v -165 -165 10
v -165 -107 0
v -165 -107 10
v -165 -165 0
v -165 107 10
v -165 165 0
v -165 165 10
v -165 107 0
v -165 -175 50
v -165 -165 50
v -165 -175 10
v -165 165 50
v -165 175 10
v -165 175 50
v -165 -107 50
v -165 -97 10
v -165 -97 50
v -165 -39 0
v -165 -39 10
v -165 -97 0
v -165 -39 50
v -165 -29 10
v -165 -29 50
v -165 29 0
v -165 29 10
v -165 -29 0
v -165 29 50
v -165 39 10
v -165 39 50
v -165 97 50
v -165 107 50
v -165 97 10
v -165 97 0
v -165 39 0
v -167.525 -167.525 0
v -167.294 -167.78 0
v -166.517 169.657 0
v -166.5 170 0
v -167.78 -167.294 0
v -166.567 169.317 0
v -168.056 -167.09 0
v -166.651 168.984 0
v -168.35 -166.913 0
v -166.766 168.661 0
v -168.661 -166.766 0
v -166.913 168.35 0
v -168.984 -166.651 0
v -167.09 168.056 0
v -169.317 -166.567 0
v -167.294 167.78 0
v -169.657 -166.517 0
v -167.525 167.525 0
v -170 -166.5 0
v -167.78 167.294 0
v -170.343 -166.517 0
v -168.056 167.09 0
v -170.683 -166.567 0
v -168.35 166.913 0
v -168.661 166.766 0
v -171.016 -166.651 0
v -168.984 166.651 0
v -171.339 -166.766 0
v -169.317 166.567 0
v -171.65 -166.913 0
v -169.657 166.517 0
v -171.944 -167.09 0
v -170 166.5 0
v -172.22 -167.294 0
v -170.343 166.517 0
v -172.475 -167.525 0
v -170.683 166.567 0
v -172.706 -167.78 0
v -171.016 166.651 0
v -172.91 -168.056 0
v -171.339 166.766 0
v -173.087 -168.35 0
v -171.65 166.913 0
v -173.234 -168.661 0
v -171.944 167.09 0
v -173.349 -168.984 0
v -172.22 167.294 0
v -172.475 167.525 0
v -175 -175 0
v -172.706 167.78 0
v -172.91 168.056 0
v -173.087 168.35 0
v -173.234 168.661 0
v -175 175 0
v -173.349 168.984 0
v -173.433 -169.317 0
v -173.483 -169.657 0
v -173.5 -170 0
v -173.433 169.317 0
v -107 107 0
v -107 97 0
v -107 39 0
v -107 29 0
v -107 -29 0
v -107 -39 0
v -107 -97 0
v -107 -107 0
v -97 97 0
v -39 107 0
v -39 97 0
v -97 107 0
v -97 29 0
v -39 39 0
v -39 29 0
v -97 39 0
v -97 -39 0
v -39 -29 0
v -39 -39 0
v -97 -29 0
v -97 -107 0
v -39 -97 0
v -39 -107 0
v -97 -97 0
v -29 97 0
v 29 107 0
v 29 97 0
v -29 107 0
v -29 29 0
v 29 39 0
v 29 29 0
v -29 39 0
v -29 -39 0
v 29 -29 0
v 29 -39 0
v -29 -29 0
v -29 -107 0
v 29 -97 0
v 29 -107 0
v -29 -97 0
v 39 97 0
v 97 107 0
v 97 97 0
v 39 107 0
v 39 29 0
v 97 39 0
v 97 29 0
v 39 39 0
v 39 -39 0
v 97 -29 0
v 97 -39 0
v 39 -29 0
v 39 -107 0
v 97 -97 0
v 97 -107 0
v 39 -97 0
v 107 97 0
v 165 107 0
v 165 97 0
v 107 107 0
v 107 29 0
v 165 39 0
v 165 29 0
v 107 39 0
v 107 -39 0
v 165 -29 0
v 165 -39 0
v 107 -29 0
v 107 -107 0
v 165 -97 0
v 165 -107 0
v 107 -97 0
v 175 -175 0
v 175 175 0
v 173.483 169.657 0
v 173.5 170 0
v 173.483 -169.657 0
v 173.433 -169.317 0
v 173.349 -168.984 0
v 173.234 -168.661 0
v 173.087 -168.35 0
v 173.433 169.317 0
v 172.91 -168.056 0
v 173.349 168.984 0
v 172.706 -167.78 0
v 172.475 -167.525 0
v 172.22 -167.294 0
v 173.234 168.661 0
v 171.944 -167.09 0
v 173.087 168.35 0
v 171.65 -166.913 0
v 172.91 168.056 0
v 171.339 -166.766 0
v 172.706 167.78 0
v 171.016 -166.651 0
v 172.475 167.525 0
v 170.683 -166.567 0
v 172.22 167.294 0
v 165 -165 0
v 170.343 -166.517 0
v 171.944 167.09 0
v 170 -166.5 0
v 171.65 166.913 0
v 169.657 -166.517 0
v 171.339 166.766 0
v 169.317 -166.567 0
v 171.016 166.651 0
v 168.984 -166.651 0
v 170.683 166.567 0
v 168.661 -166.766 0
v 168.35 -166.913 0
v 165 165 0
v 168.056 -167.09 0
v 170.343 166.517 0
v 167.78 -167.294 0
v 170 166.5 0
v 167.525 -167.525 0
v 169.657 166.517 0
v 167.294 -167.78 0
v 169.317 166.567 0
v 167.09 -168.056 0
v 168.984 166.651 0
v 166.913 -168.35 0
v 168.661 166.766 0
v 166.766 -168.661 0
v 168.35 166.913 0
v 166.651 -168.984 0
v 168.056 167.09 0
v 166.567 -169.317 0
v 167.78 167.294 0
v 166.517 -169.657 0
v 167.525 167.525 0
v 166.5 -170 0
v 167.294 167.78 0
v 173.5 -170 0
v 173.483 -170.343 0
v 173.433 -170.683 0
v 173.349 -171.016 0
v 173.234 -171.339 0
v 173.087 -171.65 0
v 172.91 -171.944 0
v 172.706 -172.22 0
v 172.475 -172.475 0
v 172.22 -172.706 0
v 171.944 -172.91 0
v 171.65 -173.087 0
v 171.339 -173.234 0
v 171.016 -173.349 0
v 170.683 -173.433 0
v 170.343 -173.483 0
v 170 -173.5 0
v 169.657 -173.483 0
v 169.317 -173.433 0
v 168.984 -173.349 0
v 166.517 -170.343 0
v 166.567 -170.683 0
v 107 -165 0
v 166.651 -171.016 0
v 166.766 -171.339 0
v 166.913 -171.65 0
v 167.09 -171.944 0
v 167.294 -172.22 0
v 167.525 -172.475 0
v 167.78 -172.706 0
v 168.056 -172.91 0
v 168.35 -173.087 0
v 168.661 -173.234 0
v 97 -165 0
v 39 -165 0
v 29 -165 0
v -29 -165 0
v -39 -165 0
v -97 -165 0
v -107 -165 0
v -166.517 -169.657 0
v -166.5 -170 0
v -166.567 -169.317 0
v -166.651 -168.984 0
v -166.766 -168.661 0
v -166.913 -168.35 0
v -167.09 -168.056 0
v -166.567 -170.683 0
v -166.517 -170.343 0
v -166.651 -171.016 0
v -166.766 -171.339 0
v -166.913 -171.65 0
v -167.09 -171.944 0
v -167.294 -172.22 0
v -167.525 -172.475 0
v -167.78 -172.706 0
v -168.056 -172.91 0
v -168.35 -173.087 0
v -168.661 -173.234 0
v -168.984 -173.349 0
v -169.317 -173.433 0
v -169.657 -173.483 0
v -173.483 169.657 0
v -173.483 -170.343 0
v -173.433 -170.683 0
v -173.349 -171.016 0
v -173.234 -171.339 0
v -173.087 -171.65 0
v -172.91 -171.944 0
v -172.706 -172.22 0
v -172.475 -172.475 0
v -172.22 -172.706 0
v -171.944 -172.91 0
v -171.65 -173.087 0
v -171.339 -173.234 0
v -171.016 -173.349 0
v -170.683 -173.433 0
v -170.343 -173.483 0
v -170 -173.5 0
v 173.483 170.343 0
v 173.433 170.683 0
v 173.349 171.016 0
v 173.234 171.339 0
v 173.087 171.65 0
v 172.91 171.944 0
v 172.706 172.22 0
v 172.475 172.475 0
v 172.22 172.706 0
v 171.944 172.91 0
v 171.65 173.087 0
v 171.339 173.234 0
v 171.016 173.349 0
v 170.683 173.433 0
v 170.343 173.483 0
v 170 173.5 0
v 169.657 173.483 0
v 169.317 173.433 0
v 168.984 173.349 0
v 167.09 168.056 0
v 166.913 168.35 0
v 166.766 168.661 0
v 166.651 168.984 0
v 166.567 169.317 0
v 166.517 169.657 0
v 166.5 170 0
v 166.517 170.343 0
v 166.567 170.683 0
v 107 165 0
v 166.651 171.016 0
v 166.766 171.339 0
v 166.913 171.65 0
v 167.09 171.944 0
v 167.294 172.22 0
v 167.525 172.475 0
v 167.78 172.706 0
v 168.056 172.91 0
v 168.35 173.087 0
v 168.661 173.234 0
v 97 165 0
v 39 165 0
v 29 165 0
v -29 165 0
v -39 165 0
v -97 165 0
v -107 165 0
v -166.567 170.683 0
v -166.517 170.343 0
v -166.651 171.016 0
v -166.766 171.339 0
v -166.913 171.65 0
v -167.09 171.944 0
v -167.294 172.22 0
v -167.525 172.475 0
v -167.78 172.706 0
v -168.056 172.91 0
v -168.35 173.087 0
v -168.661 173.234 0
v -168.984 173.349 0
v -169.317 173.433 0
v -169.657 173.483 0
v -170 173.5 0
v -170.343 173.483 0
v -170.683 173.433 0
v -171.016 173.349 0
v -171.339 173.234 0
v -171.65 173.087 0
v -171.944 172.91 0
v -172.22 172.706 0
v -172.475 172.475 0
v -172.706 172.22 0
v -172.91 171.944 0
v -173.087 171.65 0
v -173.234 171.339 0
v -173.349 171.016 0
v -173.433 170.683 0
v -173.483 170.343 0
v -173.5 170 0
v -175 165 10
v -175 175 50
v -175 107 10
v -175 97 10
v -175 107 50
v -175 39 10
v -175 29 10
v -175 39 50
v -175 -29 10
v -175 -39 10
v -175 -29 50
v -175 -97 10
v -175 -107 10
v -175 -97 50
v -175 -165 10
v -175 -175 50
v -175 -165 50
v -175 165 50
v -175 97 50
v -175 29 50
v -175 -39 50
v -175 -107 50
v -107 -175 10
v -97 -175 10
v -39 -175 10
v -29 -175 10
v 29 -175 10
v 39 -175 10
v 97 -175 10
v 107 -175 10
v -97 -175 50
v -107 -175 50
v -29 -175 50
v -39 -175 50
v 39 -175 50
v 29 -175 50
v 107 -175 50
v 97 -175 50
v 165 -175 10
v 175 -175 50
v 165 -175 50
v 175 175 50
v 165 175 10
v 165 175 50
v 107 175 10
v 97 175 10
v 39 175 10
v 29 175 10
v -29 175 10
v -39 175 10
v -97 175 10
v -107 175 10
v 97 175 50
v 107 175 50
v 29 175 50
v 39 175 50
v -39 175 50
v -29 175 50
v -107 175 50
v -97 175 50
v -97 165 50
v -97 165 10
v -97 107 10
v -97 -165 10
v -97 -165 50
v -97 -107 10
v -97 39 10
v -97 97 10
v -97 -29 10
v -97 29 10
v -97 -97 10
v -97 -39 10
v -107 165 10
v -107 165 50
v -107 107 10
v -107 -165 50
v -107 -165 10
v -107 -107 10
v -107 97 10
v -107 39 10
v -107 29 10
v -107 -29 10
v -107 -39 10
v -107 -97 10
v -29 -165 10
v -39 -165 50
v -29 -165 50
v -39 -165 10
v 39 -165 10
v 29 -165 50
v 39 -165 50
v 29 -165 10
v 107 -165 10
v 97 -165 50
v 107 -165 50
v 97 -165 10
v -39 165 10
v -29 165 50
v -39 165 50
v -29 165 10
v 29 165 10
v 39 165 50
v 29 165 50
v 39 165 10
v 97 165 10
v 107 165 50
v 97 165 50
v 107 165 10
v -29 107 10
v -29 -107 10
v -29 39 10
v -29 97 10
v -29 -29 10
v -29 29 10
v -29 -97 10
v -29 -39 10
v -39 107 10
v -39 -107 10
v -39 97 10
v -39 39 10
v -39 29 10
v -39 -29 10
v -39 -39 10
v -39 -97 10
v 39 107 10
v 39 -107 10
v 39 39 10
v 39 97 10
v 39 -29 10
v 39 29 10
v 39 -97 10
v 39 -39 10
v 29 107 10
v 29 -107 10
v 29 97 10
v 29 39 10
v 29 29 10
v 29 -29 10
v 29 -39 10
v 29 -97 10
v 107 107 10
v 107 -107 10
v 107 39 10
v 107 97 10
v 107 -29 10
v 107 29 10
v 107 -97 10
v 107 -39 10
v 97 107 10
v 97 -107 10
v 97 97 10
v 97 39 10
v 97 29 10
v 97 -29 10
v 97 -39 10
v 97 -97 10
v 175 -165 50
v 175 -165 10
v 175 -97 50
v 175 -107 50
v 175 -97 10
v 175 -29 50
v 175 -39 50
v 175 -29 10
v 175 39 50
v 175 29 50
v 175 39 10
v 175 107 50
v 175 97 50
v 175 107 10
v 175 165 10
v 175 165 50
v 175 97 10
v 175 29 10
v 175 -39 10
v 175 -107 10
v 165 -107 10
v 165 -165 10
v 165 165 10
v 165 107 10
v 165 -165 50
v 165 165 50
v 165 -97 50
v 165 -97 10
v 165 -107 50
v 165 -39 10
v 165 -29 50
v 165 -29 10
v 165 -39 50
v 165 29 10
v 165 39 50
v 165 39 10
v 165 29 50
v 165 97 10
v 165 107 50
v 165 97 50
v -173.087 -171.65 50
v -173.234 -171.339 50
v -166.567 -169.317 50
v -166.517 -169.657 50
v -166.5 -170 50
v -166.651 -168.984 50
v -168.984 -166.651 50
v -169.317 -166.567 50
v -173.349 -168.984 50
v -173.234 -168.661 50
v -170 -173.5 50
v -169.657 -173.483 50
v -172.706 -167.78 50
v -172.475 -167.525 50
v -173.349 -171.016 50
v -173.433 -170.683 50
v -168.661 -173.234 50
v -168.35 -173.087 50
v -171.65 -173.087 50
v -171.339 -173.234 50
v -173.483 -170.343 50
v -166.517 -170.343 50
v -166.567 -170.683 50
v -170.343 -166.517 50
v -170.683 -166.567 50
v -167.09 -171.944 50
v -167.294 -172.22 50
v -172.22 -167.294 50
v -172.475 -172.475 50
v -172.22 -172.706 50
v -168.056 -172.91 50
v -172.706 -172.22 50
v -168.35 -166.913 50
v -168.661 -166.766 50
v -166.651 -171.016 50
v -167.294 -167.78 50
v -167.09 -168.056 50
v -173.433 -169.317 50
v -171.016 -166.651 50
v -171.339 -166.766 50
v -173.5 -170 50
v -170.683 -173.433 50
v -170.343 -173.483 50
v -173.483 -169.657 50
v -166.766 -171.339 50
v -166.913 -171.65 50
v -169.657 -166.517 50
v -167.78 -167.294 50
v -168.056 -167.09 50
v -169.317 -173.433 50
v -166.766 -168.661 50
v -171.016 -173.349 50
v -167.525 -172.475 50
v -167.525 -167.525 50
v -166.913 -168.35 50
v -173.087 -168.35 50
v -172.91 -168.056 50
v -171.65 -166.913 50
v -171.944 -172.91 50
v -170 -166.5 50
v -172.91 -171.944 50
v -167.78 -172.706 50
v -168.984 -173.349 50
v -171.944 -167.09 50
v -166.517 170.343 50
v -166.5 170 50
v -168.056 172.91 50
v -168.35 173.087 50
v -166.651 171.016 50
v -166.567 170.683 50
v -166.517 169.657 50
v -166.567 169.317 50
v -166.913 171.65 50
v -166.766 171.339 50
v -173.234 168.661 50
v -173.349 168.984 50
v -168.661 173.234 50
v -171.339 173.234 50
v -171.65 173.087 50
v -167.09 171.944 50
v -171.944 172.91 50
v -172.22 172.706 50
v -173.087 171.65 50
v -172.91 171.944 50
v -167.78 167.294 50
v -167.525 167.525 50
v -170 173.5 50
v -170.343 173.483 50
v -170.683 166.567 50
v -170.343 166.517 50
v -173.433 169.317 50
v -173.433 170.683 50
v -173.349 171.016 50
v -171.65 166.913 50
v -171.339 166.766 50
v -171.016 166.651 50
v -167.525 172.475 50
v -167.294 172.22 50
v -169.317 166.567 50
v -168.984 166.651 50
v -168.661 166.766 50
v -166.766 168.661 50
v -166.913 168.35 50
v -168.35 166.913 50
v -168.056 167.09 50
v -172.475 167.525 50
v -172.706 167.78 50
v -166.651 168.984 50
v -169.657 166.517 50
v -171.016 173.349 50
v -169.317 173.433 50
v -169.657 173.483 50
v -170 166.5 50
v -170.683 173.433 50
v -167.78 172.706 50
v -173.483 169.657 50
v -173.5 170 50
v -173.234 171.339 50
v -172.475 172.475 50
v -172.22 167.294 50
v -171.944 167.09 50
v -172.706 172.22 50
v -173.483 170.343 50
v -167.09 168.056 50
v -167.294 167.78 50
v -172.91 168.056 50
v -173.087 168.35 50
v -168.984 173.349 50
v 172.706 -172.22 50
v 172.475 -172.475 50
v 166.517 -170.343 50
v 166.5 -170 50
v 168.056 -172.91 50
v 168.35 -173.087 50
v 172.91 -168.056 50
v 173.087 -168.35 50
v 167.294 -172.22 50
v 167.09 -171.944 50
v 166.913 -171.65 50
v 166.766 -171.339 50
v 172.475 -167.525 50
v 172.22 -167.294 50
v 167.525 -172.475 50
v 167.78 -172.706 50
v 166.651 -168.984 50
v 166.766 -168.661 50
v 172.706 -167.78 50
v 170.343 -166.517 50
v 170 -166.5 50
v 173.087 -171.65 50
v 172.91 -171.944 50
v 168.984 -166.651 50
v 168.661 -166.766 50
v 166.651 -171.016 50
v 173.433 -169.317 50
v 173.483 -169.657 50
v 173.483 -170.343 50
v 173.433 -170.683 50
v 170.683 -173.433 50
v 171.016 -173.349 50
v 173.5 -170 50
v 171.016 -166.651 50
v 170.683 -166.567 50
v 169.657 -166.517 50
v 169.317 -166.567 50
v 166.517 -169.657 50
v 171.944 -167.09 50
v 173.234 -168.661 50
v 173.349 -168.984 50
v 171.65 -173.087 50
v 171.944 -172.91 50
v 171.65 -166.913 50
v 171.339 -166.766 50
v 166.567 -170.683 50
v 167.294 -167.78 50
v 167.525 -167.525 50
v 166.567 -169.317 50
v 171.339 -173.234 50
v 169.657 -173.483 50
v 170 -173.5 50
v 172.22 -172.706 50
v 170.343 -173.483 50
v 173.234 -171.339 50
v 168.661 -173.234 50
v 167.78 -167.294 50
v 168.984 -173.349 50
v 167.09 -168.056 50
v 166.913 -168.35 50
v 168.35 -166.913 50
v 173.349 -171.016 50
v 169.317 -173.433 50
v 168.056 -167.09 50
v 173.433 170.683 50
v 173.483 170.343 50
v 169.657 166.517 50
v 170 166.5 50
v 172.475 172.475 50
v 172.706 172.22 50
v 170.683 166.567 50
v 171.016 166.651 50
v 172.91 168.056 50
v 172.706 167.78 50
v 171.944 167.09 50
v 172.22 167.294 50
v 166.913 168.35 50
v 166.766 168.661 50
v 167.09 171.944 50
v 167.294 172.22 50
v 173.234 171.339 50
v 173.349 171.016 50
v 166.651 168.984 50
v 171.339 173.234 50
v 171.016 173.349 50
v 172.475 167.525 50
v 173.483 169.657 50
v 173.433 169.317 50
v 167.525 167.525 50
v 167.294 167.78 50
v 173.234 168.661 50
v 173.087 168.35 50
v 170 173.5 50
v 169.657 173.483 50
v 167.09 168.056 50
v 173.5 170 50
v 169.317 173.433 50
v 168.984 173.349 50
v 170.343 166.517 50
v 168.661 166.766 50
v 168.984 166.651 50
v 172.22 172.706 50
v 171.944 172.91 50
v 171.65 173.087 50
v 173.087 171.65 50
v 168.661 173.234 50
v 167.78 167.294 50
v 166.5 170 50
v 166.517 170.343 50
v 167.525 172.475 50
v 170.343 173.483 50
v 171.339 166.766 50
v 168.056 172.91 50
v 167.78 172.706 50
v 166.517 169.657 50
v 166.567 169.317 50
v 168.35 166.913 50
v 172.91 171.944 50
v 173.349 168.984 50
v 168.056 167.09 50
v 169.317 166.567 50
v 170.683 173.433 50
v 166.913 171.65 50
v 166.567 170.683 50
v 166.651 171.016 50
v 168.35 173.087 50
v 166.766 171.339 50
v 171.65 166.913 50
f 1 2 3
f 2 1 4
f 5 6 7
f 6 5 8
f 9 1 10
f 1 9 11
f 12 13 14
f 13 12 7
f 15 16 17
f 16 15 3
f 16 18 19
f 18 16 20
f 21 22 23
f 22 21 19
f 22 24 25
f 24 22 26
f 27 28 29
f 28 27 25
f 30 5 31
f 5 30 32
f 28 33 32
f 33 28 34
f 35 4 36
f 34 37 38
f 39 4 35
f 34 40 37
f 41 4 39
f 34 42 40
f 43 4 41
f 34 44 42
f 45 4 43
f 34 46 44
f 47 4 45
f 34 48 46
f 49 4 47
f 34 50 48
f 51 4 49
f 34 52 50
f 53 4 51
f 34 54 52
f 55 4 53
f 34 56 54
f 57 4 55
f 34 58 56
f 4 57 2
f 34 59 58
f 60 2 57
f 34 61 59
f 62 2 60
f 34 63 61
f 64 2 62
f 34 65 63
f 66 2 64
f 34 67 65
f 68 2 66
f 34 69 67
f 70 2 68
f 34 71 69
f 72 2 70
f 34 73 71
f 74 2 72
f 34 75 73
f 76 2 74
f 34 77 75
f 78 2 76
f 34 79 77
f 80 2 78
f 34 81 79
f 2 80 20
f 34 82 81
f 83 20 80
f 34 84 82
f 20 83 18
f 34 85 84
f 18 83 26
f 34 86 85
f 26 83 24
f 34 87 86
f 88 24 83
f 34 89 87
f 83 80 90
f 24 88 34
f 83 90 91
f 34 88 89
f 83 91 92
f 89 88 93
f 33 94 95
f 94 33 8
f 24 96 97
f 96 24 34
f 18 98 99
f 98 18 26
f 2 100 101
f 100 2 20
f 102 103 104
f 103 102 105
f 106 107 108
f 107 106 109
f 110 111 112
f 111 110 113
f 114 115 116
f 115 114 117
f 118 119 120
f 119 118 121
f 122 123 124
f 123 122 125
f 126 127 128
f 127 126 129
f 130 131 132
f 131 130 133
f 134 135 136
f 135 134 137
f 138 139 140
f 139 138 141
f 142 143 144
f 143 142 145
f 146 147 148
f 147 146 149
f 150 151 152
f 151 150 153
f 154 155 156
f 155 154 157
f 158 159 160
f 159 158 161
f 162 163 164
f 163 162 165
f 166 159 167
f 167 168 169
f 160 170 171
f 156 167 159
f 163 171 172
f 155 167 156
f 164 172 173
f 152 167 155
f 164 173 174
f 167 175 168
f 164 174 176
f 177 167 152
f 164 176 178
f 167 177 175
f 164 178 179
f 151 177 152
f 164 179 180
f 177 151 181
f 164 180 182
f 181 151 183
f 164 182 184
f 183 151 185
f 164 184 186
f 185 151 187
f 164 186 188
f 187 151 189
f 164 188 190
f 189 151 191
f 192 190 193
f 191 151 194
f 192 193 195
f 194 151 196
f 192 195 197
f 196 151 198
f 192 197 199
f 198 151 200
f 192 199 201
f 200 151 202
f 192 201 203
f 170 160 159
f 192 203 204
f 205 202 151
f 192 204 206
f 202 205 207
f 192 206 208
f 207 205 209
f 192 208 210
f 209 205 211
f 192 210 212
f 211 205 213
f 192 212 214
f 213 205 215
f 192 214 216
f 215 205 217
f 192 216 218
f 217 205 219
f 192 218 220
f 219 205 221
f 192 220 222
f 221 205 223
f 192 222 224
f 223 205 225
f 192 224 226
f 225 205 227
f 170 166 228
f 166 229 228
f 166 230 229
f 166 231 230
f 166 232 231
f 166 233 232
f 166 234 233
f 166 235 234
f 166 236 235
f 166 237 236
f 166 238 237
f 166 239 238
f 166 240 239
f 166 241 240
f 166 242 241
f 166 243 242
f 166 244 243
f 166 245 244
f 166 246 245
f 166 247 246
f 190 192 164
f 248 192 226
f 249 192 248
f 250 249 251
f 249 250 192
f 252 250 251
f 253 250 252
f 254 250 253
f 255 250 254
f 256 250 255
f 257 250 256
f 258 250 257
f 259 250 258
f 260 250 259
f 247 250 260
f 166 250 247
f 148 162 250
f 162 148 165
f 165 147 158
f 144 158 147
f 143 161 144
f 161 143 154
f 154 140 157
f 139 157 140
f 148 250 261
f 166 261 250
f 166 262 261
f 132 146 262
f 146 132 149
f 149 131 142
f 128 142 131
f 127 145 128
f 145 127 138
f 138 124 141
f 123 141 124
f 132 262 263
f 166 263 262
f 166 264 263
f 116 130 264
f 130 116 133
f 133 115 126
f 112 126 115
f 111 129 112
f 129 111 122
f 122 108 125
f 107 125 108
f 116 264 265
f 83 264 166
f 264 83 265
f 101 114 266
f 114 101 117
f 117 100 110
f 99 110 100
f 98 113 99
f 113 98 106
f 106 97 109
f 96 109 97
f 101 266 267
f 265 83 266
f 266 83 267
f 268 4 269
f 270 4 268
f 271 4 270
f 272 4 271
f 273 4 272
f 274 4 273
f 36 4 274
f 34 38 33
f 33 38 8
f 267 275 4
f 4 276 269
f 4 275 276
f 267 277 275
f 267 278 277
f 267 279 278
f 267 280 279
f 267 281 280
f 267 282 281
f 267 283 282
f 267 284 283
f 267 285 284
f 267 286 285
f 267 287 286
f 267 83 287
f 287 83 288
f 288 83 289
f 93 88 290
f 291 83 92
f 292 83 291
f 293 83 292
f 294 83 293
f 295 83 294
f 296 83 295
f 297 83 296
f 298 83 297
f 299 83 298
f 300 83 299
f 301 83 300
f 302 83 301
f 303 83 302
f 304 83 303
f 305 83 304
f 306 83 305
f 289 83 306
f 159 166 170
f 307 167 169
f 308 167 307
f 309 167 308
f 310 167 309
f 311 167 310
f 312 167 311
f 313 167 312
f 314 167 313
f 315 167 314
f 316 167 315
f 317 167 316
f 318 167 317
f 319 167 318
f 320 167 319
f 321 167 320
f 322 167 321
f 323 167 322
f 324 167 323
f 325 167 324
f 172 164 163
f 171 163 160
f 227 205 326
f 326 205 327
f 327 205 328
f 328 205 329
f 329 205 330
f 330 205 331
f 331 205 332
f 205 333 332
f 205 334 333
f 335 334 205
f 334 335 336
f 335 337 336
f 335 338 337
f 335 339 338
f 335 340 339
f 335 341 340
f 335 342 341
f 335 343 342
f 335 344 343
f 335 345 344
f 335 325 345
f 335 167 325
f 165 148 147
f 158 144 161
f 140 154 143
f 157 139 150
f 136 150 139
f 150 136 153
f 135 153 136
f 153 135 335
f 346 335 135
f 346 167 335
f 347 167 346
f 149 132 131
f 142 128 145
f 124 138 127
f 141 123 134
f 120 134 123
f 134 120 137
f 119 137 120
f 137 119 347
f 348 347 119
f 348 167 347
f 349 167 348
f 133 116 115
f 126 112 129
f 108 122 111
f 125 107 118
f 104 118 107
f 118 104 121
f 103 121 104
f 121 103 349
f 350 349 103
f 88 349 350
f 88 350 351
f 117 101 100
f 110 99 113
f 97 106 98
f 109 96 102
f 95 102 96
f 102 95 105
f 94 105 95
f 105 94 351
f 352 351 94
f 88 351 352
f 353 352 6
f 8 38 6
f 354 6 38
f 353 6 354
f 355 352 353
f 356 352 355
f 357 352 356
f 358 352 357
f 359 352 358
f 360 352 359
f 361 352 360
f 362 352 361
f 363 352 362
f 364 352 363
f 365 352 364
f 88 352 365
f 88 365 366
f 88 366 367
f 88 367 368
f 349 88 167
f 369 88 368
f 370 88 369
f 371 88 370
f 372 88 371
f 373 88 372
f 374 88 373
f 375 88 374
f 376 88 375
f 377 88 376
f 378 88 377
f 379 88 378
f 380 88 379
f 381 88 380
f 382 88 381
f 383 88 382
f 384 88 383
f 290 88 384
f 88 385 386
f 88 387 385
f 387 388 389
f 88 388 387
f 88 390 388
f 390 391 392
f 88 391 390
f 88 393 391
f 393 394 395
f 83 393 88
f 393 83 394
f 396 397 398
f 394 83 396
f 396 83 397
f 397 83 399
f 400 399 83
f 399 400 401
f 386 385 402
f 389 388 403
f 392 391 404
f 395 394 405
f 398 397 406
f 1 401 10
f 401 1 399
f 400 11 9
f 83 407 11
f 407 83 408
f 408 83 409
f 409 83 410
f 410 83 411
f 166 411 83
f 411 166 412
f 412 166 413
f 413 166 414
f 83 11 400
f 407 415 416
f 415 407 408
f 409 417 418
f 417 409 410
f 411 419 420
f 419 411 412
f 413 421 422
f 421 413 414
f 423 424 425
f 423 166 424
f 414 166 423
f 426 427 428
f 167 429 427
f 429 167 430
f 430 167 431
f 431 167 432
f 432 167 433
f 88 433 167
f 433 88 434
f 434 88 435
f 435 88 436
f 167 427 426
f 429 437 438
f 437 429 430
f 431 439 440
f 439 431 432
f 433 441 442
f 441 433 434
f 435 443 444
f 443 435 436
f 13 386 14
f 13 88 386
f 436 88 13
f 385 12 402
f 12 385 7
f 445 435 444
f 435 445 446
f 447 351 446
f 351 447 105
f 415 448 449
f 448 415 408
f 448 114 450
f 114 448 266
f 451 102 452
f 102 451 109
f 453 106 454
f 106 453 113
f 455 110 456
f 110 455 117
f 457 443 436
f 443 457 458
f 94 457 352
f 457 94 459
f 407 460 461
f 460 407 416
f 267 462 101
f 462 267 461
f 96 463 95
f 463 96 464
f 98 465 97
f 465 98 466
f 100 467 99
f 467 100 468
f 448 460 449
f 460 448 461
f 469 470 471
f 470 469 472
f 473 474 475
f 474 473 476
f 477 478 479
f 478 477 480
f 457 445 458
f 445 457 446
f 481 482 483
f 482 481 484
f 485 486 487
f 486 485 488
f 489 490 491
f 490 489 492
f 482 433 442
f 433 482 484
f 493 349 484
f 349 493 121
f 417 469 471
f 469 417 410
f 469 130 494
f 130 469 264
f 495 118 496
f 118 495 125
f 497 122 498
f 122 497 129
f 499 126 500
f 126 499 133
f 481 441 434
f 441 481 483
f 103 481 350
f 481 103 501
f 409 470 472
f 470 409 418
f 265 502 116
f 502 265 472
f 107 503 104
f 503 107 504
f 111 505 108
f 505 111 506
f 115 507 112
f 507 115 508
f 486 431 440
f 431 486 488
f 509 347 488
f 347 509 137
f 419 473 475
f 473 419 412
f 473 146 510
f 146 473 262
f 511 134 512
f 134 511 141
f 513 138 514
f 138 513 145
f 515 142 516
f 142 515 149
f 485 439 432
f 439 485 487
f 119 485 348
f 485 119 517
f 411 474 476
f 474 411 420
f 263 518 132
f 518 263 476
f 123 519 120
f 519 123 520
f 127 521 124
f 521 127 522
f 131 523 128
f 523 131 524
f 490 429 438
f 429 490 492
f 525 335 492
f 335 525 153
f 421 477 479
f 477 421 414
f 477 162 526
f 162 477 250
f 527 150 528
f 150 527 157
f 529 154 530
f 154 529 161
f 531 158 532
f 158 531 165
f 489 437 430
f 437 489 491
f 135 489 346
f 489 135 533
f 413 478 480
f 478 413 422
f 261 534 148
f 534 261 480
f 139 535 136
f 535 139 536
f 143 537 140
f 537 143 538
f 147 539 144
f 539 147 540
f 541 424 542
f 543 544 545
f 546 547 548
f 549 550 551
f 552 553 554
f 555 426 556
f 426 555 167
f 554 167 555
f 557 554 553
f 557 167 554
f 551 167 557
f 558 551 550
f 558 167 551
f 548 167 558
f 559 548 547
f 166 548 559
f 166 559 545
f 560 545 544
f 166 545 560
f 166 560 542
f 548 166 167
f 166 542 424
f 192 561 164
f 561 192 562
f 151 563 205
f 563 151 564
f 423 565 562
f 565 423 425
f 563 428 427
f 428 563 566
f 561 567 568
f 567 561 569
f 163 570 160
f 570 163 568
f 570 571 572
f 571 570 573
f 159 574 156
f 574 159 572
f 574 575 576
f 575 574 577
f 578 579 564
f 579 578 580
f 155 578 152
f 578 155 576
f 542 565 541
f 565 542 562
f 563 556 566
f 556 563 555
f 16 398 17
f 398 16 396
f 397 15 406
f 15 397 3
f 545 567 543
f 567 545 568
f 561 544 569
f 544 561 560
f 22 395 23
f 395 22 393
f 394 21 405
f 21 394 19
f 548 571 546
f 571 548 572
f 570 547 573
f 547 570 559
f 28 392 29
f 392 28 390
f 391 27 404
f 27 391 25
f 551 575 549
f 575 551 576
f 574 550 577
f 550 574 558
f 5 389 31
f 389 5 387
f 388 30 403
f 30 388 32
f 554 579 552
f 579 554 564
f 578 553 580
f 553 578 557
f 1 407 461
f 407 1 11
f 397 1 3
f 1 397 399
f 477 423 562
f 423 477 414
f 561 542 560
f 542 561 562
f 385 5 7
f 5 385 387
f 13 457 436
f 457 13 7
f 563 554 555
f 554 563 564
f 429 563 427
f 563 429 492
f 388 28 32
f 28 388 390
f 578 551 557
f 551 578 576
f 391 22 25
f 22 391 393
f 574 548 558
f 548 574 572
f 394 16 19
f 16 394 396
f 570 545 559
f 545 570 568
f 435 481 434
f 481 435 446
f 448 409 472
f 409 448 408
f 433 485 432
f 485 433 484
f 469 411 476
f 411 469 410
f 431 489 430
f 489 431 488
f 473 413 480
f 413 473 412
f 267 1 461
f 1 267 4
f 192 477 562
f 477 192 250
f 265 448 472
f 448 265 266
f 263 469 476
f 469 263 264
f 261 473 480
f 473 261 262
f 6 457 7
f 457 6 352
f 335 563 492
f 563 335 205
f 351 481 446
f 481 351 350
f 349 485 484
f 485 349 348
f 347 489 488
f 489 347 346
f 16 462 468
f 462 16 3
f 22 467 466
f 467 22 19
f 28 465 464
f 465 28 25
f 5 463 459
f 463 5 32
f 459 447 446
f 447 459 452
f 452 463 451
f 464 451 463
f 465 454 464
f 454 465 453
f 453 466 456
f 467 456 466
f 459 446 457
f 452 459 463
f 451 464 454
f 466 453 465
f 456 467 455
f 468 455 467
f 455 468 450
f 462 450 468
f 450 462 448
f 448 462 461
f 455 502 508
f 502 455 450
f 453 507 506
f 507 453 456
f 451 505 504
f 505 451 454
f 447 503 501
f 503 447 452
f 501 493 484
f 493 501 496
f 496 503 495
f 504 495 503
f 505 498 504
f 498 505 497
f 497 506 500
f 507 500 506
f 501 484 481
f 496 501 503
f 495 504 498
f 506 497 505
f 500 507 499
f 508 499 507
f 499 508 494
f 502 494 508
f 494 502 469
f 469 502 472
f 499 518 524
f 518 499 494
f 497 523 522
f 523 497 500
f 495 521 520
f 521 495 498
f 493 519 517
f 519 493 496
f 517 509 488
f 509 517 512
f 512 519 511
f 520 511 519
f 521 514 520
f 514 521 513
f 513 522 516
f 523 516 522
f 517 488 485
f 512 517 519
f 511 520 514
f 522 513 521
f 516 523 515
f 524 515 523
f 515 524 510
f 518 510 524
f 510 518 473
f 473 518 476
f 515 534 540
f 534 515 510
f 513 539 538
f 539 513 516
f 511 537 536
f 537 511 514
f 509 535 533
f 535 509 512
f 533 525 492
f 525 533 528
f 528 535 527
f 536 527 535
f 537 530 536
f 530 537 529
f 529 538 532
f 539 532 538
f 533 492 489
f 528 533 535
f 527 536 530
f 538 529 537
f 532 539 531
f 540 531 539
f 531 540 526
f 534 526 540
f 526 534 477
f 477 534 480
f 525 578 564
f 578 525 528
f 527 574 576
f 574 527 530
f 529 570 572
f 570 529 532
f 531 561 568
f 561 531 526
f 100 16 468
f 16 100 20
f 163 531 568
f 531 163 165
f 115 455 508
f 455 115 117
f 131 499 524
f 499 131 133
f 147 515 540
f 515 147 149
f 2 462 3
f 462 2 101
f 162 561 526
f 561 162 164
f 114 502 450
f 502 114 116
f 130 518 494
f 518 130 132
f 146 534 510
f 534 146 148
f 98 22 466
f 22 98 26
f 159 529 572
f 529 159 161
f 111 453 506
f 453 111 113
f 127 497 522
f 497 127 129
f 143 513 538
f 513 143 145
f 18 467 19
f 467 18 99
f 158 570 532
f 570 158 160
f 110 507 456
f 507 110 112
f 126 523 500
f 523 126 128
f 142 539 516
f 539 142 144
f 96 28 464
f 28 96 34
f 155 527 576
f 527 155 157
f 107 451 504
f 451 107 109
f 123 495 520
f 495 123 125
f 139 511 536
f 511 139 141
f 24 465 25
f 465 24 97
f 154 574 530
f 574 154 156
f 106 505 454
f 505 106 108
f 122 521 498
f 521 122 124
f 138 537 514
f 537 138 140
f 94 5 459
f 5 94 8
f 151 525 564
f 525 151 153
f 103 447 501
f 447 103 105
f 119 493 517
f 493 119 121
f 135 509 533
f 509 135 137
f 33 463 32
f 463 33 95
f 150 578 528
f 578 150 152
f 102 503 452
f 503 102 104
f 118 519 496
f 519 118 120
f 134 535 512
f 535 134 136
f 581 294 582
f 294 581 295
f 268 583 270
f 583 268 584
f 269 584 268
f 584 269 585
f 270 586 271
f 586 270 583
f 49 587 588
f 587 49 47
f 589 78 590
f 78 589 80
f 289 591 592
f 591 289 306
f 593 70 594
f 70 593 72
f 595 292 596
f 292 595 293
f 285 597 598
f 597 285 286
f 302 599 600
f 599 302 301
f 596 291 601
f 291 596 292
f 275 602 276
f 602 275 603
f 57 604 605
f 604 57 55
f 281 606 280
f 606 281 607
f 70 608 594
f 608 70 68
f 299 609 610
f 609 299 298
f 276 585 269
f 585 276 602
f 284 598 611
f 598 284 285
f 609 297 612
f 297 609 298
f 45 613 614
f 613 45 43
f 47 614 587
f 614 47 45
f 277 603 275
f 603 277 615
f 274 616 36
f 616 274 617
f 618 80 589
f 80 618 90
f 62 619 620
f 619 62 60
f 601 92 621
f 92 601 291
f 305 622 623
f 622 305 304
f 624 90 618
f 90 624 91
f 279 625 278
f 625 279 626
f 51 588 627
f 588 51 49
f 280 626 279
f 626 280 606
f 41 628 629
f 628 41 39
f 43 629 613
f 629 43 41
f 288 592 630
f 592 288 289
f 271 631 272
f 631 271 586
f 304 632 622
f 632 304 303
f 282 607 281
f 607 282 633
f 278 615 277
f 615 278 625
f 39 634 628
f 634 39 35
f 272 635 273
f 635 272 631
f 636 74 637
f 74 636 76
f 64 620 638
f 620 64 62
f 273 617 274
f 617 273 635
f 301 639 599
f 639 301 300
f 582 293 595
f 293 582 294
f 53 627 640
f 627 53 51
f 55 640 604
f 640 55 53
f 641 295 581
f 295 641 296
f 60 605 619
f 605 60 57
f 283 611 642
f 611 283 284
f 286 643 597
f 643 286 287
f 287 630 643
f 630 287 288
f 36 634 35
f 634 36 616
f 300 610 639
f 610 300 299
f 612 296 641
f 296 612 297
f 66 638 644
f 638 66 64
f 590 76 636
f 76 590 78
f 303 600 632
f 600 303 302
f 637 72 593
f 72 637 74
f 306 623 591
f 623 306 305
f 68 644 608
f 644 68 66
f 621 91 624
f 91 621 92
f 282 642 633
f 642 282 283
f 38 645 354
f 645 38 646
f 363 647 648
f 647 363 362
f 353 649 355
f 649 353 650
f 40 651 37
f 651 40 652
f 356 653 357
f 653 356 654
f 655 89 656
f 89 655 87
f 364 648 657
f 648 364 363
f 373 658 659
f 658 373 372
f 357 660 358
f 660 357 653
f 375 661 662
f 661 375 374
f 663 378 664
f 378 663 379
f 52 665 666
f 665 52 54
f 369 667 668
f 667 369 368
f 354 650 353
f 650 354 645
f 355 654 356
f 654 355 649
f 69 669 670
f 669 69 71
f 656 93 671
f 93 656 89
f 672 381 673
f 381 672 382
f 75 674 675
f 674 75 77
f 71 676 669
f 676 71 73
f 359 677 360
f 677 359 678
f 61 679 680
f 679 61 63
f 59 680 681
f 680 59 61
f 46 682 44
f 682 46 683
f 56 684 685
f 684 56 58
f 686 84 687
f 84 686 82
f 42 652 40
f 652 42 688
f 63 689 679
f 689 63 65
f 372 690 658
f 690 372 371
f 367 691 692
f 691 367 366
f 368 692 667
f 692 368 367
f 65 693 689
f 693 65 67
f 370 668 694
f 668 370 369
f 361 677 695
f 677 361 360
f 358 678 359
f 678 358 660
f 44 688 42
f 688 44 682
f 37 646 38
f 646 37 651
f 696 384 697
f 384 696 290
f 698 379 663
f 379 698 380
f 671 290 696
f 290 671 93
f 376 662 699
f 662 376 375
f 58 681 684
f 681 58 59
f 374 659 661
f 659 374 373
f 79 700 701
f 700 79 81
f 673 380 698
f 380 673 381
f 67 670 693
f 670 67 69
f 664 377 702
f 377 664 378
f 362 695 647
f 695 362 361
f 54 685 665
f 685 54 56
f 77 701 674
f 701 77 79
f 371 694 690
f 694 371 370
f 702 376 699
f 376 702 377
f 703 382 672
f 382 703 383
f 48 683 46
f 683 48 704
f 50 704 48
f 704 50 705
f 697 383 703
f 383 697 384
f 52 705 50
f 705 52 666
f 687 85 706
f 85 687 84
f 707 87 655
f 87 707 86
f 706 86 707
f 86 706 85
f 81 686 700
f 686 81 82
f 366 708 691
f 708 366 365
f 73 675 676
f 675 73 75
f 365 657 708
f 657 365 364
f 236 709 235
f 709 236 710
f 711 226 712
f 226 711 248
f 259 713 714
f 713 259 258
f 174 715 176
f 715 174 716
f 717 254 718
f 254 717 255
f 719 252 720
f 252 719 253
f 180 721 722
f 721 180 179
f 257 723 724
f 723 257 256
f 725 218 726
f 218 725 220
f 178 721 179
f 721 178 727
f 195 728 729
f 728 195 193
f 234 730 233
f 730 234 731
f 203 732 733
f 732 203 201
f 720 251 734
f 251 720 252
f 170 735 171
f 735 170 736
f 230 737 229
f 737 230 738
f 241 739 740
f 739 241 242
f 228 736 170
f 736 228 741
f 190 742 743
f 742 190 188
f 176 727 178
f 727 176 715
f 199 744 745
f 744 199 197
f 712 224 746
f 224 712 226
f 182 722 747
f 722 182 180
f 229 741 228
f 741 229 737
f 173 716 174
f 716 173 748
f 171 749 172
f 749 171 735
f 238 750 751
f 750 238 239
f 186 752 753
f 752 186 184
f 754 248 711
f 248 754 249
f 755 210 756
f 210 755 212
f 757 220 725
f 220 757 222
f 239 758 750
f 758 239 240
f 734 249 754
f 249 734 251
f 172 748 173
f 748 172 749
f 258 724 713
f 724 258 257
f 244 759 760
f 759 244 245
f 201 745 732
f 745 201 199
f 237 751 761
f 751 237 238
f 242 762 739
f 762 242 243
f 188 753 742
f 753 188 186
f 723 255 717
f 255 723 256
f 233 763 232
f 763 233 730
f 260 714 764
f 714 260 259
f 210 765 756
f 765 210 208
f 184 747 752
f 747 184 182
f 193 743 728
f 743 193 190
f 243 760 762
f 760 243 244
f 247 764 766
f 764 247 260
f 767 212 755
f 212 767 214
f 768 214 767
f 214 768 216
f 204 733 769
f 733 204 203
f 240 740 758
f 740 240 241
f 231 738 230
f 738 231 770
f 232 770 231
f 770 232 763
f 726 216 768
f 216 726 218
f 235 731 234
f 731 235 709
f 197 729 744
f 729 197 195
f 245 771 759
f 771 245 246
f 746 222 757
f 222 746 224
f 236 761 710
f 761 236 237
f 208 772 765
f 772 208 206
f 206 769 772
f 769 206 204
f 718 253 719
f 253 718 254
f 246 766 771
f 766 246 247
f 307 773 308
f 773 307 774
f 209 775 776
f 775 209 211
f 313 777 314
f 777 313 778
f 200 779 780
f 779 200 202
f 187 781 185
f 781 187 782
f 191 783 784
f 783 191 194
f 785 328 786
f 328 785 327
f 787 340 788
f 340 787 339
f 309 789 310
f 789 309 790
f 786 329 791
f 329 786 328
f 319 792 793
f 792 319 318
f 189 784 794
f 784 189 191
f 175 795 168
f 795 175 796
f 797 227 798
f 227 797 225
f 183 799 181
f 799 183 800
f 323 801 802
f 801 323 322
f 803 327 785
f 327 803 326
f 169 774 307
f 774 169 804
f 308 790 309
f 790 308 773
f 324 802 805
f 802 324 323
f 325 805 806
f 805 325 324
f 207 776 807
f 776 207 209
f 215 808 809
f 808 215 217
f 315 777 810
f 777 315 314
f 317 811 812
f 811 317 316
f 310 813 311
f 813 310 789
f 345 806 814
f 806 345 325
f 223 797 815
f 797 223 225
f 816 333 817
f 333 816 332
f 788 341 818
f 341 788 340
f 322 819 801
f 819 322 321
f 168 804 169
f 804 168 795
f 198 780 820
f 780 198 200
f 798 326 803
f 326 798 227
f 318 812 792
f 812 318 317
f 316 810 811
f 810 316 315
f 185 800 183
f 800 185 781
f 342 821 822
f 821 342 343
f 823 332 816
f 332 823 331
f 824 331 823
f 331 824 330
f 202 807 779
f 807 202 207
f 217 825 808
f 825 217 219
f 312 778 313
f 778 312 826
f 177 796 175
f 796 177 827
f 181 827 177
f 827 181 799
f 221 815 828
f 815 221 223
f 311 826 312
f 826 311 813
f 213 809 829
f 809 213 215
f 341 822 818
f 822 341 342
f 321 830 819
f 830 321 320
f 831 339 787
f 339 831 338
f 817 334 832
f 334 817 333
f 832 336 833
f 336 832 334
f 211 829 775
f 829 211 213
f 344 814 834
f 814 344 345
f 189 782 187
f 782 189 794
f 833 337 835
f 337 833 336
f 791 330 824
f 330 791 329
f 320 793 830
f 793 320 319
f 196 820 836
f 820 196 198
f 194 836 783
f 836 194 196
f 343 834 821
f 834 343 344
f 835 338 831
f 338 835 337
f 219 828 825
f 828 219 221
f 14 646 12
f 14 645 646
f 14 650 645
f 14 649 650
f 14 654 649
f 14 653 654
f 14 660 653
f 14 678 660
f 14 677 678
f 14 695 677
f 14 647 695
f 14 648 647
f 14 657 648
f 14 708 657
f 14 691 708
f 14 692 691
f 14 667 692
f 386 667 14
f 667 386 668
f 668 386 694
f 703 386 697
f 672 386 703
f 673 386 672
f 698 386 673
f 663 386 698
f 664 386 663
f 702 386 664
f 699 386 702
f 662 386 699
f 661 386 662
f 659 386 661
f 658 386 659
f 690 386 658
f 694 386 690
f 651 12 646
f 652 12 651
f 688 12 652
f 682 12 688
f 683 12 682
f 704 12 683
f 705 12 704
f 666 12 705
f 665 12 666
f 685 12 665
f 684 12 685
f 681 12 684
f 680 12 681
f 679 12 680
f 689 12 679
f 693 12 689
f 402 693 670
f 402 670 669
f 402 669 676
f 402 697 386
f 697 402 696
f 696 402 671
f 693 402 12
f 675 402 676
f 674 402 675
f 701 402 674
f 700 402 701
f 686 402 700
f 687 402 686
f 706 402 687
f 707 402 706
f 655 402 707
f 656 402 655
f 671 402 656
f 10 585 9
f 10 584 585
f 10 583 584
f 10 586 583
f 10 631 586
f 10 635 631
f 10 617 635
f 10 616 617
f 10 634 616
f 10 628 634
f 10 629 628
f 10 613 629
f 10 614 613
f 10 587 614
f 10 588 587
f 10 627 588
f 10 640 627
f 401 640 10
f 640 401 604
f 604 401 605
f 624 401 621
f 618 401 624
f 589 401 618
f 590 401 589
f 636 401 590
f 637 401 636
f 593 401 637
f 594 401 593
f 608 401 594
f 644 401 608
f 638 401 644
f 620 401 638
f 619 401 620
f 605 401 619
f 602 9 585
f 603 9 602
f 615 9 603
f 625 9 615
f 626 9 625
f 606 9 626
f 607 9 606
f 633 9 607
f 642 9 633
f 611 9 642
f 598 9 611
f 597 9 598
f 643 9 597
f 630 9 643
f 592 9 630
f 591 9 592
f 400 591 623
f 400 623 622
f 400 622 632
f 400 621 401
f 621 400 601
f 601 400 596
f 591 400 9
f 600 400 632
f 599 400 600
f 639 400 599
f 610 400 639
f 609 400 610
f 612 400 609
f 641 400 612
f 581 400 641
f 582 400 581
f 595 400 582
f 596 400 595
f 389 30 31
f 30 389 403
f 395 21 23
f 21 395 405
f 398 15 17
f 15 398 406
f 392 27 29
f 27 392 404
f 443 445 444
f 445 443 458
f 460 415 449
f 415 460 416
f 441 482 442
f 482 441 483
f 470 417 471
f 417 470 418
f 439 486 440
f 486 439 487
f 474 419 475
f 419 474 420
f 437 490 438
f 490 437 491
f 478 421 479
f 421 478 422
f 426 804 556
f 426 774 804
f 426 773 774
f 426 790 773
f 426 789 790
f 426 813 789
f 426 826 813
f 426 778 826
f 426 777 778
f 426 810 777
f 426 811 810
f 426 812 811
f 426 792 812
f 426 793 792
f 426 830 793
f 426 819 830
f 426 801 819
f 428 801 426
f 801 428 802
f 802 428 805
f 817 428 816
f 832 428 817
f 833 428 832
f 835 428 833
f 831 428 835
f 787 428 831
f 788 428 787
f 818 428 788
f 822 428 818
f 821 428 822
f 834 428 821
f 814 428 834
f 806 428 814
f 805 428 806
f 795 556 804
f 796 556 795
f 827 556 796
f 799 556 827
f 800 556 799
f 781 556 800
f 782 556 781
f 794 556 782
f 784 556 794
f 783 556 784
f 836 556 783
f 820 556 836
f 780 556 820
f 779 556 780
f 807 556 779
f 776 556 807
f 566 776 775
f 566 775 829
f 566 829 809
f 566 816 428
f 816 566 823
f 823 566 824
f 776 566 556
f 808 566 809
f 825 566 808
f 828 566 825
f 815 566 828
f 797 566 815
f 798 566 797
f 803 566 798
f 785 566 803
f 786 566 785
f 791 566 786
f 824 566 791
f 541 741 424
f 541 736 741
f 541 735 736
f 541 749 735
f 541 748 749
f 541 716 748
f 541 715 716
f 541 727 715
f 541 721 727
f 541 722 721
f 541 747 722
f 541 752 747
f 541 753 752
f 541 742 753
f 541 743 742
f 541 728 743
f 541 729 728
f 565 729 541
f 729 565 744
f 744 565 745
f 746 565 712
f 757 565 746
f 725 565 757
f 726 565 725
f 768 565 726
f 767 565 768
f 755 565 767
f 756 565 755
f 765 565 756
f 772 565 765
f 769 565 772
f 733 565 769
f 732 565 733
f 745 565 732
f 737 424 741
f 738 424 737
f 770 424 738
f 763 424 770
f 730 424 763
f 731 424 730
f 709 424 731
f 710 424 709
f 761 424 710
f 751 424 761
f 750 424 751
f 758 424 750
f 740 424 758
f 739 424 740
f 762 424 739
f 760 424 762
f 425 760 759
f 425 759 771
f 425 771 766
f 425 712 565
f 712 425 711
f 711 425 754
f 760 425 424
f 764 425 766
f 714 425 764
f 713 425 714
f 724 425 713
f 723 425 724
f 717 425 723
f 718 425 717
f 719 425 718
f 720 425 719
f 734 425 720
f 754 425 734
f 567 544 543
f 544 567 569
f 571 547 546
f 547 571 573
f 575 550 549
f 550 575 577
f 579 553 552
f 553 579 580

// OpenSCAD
// Cage slice - index 0 (bottom)
bar = 10;
outer = 350;
half = outer / 2;
height = 700;

N_xy = 6;
N_z  = 11;

x_spacing = (outer - bar) / (N_xy - 1);
z_spacing = (height - bar) / (N_z  - 1);

xs = [ for (i = [0 : N_xy - 1]) (-half + bar/2 + i * x_spacing) ];
ys = xs;

zs = [ for (k = [0 : N_z - 1]) (bar/2 + k * z_spacing) ];

$fn = 64;

module cage_bars() {
    union() {
        // Vertical bars on front and back faces
        for (xv = xs) {
            translate([xv, -half + bar/2, height/2])
                cube([bar, bar, height], center = true);
            translate([xv,  half - bar/2, height/2])
                cube([bar, bar, height], center = true);
        }

        // Vertical bars on left and right faces
        for (yv = ys) {
            translate([-half + bar/2, yv, height/2])
                cube([bar, bar, height], center = true);
            translate([ half - bar/2, yv, height/2])
                cube([bar, bar, height], center = true);
        }

        // Horizontal x-bars on front and back faces
        for (zv = zs) {
            translate([0, -half + bar/2, zv])
                cube([outer, bar, bar], center = true);
            translate([0,  half - bar/2, zv])
                cube([outer, bar, bar], center = true);
        }

        // Horizontal y-bars on left and right faces
        for (zv = zs) {
            translate([-half + bar/2, 0, zv])
                cube([bar, outer, bar], center = true);
            translate([ half - bar/2, 0, zv])
                cube([bar, outer, bar], center = true);
        }

        // Floor and ceiling extra x-bars at all y positions
        z_floor = bar/2;
        z_ceil  = height - bar/2;
        for (yv = ys) {
            translate([0, yv, z_floor])
                cube([outer, bar, bar], center = true);
            translate([0, yv, z_ceil])
                cube([outer, bar, bar], center = true);
        }

        // Floor and ceiling extra y-bars at all x positions
        for (xv = xs) {
            translate([xv, 0, z_floor])
                cube([bar, outer, bar], center = true);
            translate([xv, 0, z_ceil])
                cube([bar, outer, bar], center = true);
        }
    }
}

module corner_holes() {
    hole_d = 7;
    for (sx = [-1, 1])
        for (sy = [-1, 1])
            translate([sx * (half - bar/2), sy * (half - bar/2), height/2])
                cylinder(h = height + 2, d = hole_d, center = true);
}

module cage_full() {
    difference() {
        cage_bars();
        corner_holes();
    }
}

slice_index = 0;
slice_height = 50;

module cage_slice() {
    translate([0, 0, -slice_index * slice_height]) {
        intersection() {
            cage_full();
            translate([0, 0, slice_index * slice_height + slice_height/2])
                cube([outer + 20, outer + 20, slice_height], center = true);
        }
    }
}

cage_slice();
